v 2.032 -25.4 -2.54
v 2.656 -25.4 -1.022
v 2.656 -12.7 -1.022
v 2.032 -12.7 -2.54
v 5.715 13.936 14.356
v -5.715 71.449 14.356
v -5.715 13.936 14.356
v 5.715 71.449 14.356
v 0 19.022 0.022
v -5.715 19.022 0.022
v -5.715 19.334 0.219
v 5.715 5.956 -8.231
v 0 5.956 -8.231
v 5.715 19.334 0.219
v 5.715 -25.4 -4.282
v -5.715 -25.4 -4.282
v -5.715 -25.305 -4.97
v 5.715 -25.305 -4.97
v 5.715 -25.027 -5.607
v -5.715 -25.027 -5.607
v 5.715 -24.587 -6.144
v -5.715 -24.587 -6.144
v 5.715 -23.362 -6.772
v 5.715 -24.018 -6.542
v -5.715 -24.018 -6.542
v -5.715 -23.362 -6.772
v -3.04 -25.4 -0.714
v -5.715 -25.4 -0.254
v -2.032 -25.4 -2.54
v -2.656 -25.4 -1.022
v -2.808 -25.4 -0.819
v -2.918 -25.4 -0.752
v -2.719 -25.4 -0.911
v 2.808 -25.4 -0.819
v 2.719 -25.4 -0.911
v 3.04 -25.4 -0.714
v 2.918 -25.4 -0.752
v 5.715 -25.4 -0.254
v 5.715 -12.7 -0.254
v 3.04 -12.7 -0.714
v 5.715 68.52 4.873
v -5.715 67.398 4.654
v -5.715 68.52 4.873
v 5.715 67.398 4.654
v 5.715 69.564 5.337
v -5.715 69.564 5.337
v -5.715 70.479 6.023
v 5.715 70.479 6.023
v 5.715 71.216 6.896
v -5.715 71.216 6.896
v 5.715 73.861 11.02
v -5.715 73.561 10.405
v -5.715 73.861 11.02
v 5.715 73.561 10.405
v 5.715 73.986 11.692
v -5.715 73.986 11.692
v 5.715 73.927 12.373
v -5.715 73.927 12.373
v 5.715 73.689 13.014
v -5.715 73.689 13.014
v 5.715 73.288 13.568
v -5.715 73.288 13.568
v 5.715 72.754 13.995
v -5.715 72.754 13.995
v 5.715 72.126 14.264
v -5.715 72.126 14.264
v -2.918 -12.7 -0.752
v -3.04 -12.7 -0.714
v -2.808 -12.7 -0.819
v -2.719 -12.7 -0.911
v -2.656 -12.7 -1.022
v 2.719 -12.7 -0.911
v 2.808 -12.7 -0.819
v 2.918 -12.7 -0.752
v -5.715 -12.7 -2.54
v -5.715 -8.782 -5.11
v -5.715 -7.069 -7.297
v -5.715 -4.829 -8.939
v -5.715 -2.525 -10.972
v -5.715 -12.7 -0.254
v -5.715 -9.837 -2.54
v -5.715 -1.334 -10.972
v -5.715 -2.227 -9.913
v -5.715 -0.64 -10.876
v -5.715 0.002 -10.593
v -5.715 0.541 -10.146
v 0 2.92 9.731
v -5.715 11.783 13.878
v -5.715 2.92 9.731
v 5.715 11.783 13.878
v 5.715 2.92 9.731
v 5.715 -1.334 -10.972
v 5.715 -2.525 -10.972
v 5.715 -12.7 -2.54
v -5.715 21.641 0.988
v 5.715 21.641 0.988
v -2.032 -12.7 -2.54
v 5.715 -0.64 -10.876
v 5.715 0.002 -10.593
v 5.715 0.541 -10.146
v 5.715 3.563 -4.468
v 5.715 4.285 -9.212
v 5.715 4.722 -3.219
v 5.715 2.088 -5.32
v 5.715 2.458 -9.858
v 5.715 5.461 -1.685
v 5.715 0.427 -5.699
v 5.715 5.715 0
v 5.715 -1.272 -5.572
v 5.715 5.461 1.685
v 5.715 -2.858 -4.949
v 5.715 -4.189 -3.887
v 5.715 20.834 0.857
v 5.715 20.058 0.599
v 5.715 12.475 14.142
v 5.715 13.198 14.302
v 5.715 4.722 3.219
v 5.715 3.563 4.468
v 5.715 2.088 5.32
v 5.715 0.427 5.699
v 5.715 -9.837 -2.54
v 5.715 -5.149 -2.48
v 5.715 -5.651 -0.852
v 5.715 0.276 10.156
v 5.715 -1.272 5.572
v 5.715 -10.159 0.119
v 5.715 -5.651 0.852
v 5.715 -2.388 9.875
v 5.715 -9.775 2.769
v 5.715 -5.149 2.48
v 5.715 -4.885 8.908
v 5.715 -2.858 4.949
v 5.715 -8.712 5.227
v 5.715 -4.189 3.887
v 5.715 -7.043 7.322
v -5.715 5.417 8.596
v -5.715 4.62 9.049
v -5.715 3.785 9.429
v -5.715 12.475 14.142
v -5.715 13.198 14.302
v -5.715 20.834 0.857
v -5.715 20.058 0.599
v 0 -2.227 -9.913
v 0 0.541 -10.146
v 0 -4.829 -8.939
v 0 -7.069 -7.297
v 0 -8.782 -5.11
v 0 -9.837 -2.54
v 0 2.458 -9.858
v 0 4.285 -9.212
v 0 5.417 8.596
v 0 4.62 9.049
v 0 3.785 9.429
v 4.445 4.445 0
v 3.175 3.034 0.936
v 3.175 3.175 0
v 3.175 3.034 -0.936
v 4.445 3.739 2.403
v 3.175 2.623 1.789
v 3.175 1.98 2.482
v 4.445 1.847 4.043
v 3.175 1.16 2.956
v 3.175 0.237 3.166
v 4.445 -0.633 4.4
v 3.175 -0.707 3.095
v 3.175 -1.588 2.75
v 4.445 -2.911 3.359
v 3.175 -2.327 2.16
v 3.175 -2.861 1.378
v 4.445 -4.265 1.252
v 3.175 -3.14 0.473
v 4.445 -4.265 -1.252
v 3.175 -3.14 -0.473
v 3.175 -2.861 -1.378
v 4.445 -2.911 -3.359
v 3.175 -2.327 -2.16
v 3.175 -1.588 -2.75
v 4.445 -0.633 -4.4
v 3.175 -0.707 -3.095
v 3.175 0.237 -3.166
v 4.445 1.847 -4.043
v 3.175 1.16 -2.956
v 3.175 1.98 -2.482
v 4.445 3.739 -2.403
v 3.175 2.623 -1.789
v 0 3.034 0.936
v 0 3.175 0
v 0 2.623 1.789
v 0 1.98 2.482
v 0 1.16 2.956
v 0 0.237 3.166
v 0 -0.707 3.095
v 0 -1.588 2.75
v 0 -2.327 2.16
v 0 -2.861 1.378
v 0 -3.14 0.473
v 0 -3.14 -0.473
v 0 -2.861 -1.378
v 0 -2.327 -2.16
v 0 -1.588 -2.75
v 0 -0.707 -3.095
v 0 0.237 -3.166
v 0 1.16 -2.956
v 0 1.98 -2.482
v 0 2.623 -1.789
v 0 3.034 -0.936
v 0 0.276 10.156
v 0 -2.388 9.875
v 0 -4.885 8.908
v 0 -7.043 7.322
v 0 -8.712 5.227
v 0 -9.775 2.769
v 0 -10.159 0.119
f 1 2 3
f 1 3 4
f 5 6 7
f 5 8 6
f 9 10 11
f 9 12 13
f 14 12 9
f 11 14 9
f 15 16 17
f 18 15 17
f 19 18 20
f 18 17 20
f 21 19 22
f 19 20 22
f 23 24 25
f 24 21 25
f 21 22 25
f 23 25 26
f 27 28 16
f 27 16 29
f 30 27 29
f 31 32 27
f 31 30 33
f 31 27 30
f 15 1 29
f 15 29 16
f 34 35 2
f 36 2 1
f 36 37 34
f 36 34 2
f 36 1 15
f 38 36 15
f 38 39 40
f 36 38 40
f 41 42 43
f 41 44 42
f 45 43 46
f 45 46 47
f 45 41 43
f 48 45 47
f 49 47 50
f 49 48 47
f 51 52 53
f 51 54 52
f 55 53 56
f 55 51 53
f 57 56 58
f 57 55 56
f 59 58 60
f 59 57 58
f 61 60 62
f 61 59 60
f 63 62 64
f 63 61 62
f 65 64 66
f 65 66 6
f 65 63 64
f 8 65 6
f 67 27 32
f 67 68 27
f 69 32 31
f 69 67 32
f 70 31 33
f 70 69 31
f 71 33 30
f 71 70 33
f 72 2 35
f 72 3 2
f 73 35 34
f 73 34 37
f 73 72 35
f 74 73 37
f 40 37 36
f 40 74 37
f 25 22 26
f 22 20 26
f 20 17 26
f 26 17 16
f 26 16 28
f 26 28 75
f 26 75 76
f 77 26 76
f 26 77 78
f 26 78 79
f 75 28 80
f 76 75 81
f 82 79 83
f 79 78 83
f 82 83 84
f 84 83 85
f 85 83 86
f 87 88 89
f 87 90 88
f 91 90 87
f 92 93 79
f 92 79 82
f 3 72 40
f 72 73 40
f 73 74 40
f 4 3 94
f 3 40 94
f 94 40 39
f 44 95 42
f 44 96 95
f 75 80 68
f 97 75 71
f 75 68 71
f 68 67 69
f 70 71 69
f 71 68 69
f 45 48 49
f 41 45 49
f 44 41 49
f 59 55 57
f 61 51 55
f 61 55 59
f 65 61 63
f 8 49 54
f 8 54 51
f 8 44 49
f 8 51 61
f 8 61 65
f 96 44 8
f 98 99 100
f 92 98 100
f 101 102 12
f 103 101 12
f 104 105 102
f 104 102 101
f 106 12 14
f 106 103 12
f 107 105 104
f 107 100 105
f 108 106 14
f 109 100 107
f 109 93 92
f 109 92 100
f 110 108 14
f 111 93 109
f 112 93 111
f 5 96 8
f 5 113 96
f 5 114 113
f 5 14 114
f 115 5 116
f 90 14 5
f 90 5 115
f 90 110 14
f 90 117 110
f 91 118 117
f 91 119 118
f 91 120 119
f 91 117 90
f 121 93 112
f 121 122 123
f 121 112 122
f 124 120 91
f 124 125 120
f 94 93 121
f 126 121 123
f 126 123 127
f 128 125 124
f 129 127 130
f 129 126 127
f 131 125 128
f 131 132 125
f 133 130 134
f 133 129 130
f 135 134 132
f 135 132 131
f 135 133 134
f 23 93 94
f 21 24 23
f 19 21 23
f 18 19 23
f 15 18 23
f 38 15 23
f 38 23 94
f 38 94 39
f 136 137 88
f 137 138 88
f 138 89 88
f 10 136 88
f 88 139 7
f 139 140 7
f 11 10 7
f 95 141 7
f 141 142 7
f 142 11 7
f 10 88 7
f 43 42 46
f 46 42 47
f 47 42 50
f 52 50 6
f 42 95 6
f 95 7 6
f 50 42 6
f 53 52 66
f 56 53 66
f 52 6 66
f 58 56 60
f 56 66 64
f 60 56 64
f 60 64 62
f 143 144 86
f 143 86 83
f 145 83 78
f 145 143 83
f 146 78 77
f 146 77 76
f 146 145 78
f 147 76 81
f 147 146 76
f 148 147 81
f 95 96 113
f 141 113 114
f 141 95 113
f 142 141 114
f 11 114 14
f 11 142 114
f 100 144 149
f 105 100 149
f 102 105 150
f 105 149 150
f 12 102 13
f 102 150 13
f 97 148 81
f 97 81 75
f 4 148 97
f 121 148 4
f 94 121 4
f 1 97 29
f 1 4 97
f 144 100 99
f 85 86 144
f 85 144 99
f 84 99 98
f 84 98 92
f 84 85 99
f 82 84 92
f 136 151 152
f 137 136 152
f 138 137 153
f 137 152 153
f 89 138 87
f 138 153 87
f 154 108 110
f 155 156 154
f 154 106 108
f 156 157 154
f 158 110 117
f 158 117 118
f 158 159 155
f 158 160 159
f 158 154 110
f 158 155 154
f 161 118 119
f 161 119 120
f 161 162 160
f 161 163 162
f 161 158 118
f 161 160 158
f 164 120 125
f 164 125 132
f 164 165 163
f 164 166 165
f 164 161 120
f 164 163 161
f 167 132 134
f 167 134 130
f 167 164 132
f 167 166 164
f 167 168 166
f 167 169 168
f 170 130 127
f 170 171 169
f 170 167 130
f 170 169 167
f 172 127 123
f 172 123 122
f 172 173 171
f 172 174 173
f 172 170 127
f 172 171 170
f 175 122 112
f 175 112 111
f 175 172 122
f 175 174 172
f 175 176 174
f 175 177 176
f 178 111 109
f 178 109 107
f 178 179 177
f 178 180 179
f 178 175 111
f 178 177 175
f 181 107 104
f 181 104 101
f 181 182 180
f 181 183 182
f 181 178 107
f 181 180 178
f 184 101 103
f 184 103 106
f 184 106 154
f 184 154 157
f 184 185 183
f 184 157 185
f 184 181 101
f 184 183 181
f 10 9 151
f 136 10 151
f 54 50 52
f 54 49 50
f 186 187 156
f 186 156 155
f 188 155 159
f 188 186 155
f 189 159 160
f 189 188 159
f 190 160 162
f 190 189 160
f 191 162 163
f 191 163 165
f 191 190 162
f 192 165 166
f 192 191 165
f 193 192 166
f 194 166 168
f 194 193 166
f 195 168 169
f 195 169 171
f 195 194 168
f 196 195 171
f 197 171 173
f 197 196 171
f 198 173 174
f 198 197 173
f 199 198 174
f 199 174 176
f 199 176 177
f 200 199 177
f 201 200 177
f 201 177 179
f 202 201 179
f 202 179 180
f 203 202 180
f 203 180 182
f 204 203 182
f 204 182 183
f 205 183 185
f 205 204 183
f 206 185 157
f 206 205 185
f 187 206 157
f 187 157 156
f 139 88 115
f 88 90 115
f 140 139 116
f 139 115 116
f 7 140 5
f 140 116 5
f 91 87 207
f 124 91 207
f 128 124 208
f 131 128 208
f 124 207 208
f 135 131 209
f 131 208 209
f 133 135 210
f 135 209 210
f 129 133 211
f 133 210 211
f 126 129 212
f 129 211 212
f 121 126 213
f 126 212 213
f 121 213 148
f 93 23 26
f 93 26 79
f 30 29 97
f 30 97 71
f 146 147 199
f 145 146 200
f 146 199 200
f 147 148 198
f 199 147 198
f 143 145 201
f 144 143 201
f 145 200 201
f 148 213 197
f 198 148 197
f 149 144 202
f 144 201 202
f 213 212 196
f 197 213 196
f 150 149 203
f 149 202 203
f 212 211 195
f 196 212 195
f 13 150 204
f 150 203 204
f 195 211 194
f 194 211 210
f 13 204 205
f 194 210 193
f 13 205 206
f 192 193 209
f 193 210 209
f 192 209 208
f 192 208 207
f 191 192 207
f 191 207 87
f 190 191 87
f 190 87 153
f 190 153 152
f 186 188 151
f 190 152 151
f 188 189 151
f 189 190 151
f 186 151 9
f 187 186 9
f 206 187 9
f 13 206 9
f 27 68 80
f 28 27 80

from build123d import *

# Parameters (mm, degrees)
F2_DEPTH     = 5.715
F3_R         = 5.08
F4_R         = 2.54
F0_R         = 10.16
F0_R_2       = 3.175
F5_DEPTH     = 5.715
F7_DEPTH     = 25.4
F9_DEPTH     = 5.715
F10_T1_DEPTH = 10.4031459942
F10_T3_DEPTH = 10.4031462213
F10_T5_DEPTH = 21.8251062119
F12_DEPTH    = 12.7
F13_R        = 0.508
F14_SIZE     = 2.54


# Not quite as in the source:
# - a fillet or chamfer that OpenCascade refuses, or shapes differently, is made with other operations: its cross-section is extruded or revolved along the edge and cut away or added


with BuildPart() as f2:
    # F1 (on Right) → F2 (new body, symmetric)
    with BuildSketch(Plane.YZ):
        Polygon((20.3924354673, 0.8880047341), (69.85, 4.8502287827), (76.2, 14.35636729), (12.8064267337, 14.35636729), (2.9200423986, 9.7313386741), (8.2383593544, 1.7451149179), (4.8682624474, -6.6303843632), (5.9557488763, -8.2313216024), align=None)
    extrude(amount=F2_DEPTH, both=True)

    # F3
    f3_edges = [f2.edges().sort_by_distance(p)[0] for p in [
        (0, 12.806427, 14.356367),
        (0, 69.85, 4.850229),
        (0, 20.392435, 0.888005),
    ]]
    fillet(f3_edges, radius=F3_R)

    # F4
    f4_edges = [f2.edges().sort_by_distance(p)[0] for p in [
        (0, 76.2, 14.356367),
    ]]
    fillet(f4_edges, radius=F4_R)

    # F0 (on Right) → F5 (join)
    with BuildSketch(Plane.YZ):
        Circle(F0_R)
        Circle(F0_R_2, mode=Mode.SUBTRACT)
    extrude(amount=F5_DEPTH)

    # F6 (on Right) → F7 (cut)
    with BuildSketch(Plane.YZ):
        with BuildLine():
            Line((19.0573167056, 0), (5.4165862694, 8.5957078351))
            ThreePointArc((5.4165862694, 8.5957078351), (-10.1595718617, -0.0932715764), (5.5734885208, -8.4948116935))
            Line((5.5734885208, -8.4948116935), (19.0573167056, 0))
        make_face()
    extrude(amount=-F7_DEPTH, mode=Mode.SUBTRACT)

    # F8 (on Right) → F9 (join, symmetric)
    with BuildSketch(Plane.YZ):
        with BuildLine():
            Line((0.5413664183, -10.9723807834), (0.5413664183, -10.1455666378))
            ThreePointArc((0.5413664183, -10.1455666378), (-6.0054239987, -8.1951499434), (-9.8373776994, -2.54))
            Line((-9.8373776994, -2.54), (-25.4, -2.54))
            Line((-25.4, -2.54), (-25.4, -6.360667292))
            Line((-25.4, -6.360667292), (-2.5253696451, -10.9723807834))
            Line((-2.5253696451, -10.9723807834), (0.5413664183, -10.9723807834))
        make_face()
    extrude(amount=F9_DEPTH, both=True)

    # F10: fillet of radius 2.54 on 2 edges, made by hand

    # F10_s2 → F10_t1 (cut)
    with BuildSketch(Plane.YZ.offset(-10.4031461077)):
        with BuildLine():
            ThreePointArc((0.5413664183, -10.1455666378), (-0.3091706163, -10.7565034211), (-1.3338920247, -10.9723807834))
            Line((-1.3338920247, -10.9723807834), (0.5413664183, -10.9723807834))
            Line((0.5413664183, -10.9723807834), (0.5413664183, -10.1455666378))
        make_face()
    extrude(amount=F10_T1_DEPTH, mode=Mode.SUBTRACT)

    # F10_s4 → F10_t3 (cut)
    with BuildSketch(Plane.YZ.offset(-1.135e-07)):
        with BuildLine():
            ThreePointArc((0.5413664183, -10.1455666378), (-0.3091706163, -10.7565034211), (-1.3338920247, -10.9723807834))
            Line((-1.3338920247, -10.9723807834), (0.5413664183, -10.9723807834))
            Line((0.5413664183, -10.9723807834), (0.5413664183, -10.1455666378))
        make_face()
    extrude(amount=F10_T3_DEPTH, mode=Mode.SUBTRACT)

    # F10_s6 → F10_t5 (cut)
    with BuildSketch(Plane.YZ.offset(-10.912553106)):
        with BuildLine():
            ThreePointArc((-25.4, -4.2816460496), (-24.8255331463, -5.8904591062), (-23.3619846843, -6.7715479306))
            Line((-23.3619846843, -6.7715479306), (-25.4, -6.360667292))
            Line((-25.4, -6.360667292), (-25.4, -4.2816460496))
        make_face()
    extrude(amount=F10_T5_DEPTH, mode=Mode.SUBTRACT)

    # F11 (on face) → F12 (join)
    with BuildSketch(Plane.XZ.offset(25.4)):
        Polygon((2.7630305849, -0.762), (2.032, -2.54), (5.715, -2.54), (5.715, -0.254), align=None)
        Polygon((-5.715, -2.54), (-2.032, -2.54), (-2.7630305849, -0.762), (-5.715, -0.254), align=None)
    extrude(amount=-F12_DEPTH)

    # F13
    f13_edges = [f2.edges().sort_by_distance(p)[0] for p in [
        (-2.763031, -19.05, -0.762),
        (2.763031, -19.05, -0.762),
    ]]
    fillet(f13_edges, radius=F13_R)

    # F14
    f14_edges = [f2.edges().sort_by_distance(p)[0] for p in [
        (5.715, -3.175, 0),
    ]]
    chamfer(f14_edges, length=F14_SIZE)


solid = f2.part
